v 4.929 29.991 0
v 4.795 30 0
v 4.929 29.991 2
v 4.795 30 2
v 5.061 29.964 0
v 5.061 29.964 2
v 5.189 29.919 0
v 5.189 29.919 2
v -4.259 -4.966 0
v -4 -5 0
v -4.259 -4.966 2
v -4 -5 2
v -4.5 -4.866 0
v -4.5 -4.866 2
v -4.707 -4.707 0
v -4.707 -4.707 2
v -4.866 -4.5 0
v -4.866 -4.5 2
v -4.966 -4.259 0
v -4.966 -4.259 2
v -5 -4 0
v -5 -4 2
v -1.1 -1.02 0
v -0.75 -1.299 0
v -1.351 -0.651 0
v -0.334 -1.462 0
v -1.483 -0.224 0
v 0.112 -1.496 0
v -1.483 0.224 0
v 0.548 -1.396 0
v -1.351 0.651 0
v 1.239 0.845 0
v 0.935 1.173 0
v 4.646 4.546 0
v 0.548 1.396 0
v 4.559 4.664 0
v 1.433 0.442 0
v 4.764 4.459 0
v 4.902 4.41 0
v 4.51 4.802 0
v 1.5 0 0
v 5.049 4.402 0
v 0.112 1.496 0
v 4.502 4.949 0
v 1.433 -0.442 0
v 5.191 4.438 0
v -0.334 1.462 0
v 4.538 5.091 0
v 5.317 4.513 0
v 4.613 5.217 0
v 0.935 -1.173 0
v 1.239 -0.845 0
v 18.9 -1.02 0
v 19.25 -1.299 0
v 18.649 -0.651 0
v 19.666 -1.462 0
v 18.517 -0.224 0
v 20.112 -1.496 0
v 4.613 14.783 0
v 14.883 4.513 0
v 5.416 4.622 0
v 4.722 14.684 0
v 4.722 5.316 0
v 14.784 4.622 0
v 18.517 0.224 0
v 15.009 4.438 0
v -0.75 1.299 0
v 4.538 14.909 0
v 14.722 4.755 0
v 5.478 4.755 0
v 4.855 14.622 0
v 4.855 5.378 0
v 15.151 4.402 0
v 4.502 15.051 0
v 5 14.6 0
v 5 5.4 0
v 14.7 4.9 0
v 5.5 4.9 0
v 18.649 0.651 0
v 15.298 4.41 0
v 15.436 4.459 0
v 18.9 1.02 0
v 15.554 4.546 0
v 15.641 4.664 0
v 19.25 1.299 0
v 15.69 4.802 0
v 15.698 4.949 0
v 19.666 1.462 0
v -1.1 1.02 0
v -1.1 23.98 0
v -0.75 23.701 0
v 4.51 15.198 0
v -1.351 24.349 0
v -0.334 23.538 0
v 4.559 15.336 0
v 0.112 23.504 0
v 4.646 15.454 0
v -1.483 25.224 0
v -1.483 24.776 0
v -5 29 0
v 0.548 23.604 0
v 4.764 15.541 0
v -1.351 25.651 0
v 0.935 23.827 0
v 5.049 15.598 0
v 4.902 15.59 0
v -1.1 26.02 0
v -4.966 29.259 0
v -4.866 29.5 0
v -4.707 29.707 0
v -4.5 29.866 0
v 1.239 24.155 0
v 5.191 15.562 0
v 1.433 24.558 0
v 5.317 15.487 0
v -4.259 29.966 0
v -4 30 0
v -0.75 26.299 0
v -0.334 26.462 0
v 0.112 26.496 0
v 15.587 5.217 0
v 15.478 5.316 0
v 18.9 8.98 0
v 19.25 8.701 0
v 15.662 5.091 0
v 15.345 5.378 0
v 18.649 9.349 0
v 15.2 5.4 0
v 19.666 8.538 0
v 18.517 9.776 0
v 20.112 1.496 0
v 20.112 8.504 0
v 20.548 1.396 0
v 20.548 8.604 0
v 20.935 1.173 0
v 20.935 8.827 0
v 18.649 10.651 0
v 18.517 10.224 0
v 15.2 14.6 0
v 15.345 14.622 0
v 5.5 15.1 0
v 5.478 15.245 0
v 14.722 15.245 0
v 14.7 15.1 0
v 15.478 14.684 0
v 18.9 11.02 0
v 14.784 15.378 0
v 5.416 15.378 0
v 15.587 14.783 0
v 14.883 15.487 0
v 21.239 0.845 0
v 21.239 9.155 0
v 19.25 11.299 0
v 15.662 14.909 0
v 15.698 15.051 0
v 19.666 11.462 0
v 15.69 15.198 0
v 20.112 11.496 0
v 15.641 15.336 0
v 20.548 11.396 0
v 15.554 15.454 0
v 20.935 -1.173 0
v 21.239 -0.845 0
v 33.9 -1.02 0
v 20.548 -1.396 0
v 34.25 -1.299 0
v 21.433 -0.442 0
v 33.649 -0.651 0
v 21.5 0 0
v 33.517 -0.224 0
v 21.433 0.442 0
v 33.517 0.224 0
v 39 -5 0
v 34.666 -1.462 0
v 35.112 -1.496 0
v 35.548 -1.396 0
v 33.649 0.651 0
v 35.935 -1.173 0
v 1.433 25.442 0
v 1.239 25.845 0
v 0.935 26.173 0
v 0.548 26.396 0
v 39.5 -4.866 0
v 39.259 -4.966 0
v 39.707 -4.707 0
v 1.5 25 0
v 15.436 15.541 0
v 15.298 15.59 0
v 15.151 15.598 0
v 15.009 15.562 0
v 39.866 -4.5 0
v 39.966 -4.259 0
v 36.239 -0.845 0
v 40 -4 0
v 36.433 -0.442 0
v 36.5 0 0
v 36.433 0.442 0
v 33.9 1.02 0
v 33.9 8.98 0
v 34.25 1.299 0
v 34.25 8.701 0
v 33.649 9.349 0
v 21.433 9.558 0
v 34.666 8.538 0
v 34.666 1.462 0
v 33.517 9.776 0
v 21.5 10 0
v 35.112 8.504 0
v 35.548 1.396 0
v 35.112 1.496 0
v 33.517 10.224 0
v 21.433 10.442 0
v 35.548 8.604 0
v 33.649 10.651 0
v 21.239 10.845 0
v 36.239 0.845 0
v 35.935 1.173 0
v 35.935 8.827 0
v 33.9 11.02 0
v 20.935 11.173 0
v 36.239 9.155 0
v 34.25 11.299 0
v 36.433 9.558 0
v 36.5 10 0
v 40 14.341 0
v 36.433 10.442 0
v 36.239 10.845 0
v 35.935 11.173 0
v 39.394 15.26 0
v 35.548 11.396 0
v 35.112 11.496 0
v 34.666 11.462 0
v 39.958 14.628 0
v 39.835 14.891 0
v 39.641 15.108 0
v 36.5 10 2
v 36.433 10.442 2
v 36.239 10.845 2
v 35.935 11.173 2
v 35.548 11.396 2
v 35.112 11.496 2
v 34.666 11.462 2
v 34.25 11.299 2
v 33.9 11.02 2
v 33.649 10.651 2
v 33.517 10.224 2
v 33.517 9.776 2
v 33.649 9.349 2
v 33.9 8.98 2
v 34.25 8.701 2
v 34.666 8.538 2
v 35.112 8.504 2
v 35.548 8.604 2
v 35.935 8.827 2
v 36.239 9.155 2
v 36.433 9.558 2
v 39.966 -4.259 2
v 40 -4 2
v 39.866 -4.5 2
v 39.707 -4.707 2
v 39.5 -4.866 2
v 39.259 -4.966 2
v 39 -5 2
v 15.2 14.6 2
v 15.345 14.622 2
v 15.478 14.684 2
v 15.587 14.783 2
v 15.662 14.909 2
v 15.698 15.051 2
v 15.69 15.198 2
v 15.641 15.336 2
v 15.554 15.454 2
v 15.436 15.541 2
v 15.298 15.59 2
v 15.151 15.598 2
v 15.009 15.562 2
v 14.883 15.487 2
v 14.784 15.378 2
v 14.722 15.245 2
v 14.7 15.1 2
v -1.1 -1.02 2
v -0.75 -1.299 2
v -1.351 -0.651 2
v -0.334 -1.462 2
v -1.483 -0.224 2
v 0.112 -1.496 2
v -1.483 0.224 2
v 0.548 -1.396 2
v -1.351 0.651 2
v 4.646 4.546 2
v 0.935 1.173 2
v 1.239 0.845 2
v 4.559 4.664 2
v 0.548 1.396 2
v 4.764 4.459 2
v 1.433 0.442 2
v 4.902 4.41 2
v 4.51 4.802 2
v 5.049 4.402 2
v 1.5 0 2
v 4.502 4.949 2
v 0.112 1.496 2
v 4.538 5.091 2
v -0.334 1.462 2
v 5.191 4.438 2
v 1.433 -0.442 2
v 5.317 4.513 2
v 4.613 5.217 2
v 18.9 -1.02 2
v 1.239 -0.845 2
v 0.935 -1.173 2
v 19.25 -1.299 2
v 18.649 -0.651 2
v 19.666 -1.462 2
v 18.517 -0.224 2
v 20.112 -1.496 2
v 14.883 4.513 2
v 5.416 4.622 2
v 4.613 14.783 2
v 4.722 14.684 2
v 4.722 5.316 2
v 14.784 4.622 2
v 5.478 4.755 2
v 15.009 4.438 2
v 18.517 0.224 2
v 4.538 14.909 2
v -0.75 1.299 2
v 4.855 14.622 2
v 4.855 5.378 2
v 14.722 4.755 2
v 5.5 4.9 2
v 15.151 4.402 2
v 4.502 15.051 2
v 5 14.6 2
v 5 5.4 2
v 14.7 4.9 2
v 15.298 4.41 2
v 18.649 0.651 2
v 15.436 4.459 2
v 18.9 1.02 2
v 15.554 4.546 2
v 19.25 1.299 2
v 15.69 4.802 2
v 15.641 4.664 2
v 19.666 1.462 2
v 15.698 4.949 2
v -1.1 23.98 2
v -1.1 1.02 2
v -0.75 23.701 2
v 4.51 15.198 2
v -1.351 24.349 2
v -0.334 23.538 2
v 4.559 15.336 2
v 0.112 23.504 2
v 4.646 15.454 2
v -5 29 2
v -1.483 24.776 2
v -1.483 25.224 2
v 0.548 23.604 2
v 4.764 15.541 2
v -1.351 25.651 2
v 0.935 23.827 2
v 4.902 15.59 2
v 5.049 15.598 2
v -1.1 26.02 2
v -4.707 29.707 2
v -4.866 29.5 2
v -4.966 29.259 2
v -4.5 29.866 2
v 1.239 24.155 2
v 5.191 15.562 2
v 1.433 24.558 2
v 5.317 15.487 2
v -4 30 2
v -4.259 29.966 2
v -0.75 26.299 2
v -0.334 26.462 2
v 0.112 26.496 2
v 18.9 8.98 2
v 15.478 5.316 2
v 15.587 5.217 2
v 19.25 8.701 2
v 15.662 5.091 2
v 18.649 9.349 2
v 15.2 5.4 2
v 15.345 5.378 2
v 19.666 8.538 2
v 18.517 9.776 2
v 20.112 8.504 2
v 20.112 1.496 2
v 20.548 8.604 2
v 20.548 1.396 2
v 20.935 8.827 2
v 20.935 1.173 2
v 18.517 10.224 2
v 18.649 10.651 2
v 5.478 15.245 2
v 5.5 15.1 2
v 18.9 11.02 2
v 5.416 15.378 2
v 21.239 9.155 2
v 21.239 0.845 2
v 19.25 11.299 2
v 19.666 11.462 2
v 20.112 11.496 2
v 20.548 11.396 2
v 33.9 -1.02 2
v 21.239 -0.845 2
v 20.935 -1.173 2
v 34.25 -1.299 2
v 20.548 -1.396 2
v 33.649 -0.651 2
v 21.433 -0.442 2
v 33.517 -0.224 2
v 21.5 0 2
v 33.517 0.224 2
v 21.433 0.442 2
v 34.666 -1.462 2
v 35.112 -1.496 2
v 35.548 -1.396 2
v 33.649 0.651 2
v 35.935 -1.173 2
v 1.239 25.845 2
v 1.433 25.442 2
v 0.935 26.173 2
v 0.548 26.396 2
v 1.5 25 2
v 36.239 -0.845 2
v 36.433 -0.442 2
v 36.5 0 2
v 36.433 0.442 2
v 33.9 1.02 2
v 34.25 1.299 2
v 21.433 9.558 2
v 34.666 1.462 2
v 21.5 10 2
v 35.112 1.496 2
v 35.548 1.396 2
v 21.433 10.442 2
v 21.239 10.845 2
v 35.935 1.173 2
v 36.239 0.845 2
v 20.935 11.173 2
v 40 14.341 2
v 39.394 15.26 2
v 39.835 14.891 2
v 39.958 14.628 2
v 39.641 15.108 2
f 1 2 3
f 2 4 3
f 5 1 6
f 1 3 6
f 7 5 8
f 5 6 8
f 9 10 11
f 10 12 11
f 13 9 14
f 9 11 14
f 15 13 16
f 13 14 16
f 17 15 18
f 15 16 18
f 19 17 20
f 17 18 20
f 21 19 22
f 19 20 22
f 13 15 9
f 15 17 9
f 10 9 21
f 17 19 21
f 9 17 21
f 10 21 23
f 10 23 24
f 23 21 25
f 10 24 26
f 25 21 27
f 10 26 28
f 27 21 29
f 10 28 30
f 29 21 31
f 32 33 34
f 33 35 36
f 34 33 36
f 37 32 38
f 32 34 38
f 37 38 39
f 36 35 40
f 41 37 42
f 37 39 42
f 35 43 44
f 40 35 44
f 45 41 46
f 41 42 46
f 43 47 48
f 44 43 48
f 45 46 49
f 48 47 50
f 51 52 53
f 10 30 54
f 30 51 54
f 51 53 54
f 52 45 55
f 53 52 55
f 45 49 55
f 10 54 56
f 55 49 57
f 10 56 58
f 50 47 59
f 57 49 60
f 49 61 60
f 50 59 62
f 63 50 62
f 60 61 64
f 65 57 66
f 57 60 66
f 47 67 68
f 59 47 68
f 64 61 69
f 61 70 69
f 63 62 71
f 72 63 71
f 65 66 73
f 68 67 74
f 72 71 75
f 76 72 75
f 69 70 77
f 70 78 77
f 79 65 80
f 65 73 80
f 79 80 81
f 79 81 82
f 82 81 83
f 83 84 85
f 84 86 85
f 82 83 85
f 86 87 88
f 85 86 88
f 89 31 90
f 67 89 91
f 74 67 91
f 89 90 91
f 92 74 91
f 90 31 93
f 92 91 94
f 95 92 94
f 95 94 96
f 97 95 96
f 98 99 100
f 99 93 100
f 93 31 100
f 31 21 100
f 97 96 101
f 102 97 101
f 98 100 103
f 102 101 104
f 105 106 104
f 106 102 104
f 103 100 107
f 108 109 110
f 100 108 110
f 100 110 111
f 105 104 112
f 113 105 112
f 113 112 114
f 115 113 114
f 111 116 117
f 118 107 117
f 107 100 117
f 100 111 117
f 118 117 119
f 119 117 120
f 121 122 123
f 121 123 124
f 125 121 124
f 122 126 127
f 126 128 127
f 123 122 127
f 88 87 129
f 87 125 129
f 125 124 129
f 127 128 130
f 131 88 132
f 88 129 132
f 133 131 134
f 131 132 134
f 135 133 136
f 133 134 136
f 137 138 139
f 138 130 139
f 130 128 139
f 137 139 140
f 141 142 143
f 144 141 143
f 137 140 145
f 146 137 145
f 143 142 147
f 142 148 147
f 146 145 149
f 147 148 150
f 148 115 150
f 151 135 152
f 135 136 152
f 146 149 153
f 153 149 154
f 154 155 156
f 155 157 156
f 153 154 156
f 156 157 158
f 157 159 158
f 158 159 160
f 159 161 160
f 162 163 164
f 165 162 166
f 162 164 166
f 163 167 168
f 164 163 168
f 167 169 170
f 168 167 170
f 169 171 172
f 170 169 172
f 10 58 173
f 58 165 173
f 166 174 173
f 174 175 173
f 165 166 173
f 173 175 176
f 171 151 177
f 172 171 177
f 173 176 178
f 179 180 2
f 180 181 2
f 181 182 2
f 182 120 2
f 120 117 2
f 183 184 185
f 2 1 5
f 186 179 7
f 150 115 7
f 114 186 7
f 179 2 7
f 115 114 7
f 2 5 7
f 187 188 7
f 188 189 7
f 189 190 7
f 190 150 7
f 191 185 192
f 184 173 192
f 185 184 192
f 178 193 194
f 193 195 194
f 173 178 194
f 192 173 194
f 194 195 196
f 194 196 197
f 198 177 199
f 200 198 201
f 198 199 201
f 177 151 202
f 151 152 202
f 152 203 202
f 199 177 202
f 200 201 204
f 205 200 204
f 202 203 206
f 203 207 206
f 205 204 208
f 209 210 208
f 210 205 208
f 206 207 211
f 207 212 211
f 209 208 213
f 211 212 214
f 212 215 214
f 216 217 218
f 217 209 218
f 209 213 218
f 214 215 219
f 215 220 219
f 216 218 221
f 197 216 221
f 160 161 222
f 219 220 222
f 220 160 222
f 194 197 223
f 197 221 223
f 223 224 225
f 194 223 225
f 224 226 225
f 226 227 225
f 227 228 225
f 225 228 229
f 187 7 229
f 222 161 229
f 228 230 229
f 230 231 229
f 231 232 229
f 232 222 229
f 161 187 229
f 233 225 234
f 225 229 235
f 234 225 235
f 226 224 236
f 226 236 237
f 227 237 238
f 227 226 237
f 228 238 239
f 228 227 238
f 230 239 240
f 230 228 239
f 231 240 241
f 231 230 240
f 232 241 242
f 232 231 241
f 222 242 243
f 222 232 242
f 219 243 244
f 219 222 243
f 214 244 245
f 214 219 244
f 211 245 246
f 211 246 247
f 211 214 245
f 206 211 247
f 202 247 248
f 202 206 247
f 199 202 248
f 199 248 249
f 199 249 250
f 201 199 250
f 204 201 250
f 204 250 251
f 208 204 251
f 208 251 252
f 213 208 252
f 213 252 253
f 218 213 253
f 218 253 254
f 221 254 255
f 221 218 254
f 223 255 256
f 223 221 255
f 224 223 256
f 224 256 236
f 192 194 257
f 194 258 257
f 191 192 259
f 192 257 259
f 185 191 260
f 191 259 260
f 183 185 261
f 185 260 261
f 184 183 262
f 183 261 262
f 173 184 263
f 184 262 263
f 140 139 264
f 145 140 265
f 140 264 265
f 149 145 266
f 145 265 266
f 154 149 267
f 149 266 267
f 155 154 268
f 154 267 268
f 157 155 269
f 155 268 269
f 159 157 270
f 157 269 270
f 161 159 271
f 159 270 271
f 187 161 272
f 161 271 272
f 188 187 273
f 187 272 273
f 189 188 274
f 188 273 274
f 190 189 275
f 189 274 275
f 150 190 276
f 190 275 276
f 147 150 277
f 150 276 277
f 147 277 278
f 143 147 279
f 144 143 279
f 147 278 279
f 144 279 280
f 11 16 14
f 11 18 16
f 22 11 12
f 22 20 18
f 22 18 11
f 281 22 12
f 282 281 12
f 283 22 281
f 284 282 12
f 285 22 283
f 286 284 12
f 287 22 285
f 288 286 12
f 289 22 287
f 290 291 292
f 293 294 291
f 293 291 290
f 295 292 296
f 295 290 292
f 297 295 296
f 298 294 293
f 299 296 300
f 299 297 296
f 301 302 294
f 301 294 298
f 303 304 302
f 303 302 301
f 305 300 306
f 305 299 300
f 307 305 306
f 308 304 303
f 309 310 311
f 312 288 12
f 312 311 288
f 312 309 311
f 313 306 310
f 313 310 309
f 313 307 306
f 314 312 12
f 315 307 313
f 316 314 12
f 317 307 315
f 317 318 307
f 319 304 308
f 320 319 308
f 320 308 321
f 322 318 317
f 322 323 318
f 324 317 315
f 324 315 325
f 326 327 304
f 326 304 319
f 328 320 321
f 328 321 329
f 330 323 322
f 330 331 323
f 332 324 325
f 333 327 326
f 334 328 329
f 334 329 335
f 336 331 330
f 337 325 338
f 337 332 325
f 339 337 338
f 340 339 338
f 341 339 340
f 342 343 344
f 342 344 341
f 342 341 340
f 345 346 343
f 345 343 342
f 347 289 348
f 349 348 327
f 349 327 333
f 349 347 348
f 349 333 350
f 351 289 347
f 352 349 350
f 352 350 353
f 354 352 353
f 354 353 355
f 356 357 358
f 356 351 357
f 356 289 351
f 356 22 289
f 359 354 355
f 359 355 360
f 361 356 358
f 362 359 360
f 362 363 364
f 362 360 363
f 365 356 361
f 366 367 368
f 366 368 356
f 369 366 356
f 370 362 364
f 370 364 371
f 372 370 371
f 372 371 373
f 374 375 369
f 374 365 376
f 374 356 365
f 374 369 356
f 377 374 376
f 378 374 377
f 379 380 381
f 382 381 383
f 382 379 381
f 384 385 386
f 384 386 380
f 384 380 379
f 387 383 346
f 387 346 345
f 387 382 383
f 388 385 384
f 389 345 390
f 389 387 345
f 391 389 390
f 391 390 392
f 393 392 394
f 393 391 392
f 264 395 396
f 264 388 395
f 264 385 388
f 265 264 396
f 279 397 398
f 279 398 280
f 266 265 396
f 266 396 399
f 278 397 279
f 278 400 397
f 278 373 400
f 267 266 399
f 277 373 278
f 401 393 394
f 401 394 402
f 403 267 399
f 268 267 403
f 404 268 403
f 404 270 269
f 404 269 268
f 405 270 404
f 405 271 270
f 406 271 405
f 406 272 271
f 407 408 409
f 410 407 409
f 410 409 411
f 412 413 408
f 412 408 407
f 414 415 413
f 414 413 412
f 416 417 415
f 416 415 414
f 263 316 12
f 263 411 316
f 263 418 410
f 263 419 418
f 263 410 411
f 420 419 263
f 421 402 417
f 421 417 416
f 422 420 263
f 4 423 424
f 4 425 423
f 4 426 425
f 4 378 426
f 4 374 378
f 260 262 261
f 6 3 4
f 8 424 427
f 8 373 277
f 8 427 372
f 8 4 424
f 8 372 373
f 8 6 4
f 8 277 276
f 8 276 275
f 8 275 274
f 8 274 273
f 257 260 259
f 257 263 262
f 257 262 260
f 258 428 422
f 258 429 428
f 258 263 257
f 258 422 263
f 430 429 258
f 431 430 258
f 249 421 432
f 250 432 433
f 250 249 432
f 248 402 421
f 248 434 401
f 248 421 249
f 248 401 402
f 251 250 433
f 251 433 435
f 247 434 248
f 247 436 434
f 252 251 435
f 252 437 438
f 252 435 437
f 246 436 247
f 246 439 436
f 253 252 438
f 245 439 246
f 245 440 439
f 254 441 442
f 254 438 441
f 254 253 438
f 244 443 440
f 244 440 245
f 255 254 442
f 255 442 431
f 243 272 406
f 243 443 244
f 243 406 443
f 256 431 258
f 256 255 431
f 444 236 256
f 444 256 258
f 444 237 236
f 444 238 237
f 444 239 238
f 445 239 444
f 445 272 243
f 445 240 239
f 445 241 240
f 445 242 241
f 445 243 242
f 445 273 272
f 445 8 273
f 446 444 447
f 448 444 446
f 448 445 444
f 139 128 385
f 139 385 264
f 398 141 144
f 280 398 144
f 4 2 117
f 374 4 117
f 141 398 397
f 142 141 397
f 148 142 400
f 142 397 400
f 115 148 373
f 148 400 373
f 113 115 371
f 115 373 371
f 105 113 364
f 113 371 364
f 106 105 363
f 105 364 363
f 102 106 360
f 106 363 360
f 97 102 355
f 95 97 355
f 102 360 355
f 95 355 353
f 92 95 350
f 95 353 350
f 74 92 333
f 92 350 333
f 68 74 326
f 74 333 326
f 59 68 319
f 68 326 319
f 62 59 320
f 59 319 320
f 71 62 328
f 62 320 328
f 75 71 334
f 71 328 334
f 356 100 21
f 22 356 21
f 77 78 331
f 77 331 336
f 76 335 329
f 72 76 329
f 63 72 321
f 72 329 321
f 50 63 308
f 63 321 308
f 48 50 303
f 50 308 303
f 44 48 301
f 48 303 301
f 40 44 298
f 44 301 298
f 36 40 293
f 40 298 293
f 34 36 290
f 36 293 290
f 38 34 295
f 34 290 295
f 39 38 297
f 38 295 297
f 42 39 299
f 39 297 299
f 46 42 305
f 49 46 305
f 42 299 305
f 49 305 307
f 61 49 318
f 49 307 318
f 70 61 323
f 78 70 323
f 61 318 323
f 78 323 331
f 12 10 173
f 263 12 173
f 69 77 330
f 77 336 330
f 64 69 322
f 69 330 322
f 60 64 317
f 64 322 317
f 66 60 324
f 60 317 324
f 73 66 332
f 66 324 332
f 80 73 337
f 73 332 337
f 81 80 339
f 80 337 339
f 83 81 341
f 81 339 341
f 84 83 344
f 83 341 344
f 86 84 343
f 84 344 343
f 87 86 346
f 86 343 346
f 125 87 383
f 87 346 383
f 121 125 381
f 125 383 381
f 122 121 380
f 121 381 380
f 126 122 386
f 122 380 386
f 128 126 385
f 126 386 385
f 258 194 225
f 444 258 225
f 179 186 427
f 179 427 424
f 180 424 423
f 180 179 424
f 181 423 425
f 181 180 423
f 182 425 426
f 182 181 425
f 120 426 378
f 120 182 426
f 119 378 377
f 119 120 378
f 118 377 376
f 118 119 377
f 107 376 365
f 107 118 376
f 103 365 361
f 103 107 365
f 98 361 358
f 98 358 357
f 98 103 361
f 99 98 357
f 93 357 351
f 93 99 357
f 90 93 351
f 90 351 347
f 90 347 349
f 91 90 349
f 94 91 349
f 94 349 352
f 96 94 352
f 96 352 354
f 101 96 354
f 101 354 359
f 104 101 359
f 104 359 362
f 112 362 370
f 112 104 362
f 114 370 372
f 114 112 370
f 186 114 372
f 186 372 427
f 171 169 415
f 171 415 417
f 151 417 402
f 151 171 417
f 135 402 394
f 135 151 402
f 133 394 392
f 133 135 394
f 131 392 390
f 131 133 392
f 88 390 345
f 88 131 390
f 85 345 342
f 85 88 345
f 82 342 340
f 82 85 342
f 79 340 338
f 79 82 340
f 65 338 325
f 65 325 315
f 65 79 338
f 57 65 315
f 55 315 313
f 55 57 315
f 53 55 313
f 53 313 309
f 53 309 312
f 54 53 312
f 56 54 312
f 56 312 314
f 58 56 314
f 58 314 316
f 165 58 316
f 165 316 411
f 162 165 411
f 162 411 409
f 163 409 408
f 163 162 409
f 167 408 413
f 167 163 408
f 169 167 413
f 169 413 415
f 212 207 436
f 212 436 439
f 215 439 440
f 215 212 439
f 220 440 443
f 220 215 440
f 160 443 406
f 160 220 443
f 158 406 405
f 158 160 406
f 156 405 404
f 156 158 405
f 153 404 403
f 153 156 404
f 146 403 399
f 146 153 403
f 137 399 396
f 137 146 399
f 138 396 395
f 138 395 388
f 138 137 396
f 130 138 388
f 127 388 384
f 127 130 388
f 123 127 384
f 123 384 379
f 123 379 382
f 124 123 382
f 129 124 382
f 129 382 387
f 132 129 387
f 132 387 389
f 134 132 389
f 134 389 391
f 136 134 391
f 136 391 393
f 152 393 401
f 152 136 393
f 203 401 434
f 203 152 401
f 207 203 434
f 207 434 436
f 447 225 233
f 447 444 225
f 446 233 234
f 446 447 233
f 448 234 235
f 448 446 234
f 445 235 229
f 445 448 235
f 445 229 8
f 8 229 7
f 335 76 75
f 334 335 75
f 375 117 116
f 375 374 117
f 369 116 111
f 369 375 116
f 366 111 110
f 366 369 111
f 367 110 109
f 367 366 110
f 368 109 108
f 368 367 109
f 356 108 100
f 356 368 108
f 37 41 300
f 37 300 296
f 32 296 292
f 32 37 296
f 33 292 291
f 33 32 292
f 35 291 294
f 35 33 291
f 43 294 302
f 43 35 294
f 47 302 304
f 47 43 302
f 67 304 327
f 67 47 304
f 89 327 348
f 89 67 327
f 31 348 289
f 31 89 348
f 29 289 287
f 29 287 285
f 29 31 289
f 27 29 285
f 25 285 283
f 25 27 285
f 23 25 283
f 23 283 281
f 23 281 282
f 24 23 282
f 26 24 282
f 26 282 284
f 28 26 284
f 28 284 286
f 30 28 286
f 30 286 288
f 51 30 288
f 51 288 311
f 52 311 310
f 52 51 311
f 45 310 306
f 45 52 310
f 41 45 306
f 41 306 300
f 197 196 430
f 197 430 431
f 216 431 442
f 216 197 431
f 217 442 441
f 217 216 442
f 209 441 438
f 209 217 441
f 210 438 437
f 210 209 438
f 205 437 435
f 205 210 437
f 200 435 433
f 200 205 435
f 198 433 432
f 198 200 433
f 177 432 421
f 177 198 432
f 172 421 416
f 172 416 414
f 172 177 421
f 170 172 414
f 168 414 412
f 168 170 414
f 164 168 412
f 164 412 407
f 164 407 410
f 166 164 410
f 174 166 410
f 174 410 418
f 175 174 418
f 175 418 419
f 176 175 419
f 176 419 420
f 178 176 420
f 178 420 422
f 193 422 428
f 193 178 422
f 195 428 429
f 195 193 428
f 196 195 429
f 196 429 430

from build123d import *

# Parameters (mm, degrees)
SKETCH_1_R          = 1.5
SKETCH_1_W          = 10.2
SKETCH_1_H          = 10.2
EXTRUDE_1_DEPTH     = 2
SKETCH_2_R          = 0.5
CUT_EXTRUDE_1_DEPTH = 10
FILLET_1_R          = 1


with BuildPart() as part:
    # 草图1 → 凸台-拉伸1 (new body)
    with BuildSketch(Plane.XY):
        Polygon((5, 30), (-5, 30), (-5, -5), (40, -5), (40, 15), align=None)
        Circle(SKETCH_1_R, mode=Mode.SUBTRACT)
        with Locations((10.1, 10)):
            Rectangle(SKETCH_1_W, SKETCH_1_H, mode=Mode.SUBTRACT)
        with Locations((20, 0)):
            Circle(SKETCH_1_R, mode=Mode.SUBTRACT)
        with Locations((35, 0)):
            Circle(SKETCH_1_R, mode=Mode.SUBTRACT)
        with Locations((20, 10)):
            Circle(SKETCH_1_R, mode=Mode.SUBTRACT)
        with Locations((35, 10)):
            Circle(SKETCH_1_R, mode=Mode.SUBTRACT)
        with Locations((0, 25)):
            Circle(SKETCH_1_R, mode=Mode.SUBTRACT)
    extrude(amount=EXTRUDE_1_DEPTH)

    # 草图2 → 切除-拉伸1 (cut)
    with BuildSketch(Plane.XY.offset(2)):
        with Locations((15.2, 15.1)):
            Circle(SKETCH_2_R)
        with Locations((15.2, 4.9)):
            Circle(SKETCH_2_R)
        with Locations((5, 15.1)):
            Circle(SKETCH_2_R)
        with Locations((5, 4.9)):
            Circle(SKETCH_2_R)
    extrude(amount=-CUT_EXTRUDE_1_DEPTH, mode=Mode.SUBTRACT)

    # 圆角1
    fillet_1_edges = [part.edges().sort_by_distance(p)[0] for p in [
        (-5, 30, 1),
        (5, 30, 1),
        (40, 15, 1),
        (40, -5, 1),
        (-5, -5, 1),
    ]]
    fillet(fillet_1_edges, radius=FILLET_1_R)


solid = part.part
